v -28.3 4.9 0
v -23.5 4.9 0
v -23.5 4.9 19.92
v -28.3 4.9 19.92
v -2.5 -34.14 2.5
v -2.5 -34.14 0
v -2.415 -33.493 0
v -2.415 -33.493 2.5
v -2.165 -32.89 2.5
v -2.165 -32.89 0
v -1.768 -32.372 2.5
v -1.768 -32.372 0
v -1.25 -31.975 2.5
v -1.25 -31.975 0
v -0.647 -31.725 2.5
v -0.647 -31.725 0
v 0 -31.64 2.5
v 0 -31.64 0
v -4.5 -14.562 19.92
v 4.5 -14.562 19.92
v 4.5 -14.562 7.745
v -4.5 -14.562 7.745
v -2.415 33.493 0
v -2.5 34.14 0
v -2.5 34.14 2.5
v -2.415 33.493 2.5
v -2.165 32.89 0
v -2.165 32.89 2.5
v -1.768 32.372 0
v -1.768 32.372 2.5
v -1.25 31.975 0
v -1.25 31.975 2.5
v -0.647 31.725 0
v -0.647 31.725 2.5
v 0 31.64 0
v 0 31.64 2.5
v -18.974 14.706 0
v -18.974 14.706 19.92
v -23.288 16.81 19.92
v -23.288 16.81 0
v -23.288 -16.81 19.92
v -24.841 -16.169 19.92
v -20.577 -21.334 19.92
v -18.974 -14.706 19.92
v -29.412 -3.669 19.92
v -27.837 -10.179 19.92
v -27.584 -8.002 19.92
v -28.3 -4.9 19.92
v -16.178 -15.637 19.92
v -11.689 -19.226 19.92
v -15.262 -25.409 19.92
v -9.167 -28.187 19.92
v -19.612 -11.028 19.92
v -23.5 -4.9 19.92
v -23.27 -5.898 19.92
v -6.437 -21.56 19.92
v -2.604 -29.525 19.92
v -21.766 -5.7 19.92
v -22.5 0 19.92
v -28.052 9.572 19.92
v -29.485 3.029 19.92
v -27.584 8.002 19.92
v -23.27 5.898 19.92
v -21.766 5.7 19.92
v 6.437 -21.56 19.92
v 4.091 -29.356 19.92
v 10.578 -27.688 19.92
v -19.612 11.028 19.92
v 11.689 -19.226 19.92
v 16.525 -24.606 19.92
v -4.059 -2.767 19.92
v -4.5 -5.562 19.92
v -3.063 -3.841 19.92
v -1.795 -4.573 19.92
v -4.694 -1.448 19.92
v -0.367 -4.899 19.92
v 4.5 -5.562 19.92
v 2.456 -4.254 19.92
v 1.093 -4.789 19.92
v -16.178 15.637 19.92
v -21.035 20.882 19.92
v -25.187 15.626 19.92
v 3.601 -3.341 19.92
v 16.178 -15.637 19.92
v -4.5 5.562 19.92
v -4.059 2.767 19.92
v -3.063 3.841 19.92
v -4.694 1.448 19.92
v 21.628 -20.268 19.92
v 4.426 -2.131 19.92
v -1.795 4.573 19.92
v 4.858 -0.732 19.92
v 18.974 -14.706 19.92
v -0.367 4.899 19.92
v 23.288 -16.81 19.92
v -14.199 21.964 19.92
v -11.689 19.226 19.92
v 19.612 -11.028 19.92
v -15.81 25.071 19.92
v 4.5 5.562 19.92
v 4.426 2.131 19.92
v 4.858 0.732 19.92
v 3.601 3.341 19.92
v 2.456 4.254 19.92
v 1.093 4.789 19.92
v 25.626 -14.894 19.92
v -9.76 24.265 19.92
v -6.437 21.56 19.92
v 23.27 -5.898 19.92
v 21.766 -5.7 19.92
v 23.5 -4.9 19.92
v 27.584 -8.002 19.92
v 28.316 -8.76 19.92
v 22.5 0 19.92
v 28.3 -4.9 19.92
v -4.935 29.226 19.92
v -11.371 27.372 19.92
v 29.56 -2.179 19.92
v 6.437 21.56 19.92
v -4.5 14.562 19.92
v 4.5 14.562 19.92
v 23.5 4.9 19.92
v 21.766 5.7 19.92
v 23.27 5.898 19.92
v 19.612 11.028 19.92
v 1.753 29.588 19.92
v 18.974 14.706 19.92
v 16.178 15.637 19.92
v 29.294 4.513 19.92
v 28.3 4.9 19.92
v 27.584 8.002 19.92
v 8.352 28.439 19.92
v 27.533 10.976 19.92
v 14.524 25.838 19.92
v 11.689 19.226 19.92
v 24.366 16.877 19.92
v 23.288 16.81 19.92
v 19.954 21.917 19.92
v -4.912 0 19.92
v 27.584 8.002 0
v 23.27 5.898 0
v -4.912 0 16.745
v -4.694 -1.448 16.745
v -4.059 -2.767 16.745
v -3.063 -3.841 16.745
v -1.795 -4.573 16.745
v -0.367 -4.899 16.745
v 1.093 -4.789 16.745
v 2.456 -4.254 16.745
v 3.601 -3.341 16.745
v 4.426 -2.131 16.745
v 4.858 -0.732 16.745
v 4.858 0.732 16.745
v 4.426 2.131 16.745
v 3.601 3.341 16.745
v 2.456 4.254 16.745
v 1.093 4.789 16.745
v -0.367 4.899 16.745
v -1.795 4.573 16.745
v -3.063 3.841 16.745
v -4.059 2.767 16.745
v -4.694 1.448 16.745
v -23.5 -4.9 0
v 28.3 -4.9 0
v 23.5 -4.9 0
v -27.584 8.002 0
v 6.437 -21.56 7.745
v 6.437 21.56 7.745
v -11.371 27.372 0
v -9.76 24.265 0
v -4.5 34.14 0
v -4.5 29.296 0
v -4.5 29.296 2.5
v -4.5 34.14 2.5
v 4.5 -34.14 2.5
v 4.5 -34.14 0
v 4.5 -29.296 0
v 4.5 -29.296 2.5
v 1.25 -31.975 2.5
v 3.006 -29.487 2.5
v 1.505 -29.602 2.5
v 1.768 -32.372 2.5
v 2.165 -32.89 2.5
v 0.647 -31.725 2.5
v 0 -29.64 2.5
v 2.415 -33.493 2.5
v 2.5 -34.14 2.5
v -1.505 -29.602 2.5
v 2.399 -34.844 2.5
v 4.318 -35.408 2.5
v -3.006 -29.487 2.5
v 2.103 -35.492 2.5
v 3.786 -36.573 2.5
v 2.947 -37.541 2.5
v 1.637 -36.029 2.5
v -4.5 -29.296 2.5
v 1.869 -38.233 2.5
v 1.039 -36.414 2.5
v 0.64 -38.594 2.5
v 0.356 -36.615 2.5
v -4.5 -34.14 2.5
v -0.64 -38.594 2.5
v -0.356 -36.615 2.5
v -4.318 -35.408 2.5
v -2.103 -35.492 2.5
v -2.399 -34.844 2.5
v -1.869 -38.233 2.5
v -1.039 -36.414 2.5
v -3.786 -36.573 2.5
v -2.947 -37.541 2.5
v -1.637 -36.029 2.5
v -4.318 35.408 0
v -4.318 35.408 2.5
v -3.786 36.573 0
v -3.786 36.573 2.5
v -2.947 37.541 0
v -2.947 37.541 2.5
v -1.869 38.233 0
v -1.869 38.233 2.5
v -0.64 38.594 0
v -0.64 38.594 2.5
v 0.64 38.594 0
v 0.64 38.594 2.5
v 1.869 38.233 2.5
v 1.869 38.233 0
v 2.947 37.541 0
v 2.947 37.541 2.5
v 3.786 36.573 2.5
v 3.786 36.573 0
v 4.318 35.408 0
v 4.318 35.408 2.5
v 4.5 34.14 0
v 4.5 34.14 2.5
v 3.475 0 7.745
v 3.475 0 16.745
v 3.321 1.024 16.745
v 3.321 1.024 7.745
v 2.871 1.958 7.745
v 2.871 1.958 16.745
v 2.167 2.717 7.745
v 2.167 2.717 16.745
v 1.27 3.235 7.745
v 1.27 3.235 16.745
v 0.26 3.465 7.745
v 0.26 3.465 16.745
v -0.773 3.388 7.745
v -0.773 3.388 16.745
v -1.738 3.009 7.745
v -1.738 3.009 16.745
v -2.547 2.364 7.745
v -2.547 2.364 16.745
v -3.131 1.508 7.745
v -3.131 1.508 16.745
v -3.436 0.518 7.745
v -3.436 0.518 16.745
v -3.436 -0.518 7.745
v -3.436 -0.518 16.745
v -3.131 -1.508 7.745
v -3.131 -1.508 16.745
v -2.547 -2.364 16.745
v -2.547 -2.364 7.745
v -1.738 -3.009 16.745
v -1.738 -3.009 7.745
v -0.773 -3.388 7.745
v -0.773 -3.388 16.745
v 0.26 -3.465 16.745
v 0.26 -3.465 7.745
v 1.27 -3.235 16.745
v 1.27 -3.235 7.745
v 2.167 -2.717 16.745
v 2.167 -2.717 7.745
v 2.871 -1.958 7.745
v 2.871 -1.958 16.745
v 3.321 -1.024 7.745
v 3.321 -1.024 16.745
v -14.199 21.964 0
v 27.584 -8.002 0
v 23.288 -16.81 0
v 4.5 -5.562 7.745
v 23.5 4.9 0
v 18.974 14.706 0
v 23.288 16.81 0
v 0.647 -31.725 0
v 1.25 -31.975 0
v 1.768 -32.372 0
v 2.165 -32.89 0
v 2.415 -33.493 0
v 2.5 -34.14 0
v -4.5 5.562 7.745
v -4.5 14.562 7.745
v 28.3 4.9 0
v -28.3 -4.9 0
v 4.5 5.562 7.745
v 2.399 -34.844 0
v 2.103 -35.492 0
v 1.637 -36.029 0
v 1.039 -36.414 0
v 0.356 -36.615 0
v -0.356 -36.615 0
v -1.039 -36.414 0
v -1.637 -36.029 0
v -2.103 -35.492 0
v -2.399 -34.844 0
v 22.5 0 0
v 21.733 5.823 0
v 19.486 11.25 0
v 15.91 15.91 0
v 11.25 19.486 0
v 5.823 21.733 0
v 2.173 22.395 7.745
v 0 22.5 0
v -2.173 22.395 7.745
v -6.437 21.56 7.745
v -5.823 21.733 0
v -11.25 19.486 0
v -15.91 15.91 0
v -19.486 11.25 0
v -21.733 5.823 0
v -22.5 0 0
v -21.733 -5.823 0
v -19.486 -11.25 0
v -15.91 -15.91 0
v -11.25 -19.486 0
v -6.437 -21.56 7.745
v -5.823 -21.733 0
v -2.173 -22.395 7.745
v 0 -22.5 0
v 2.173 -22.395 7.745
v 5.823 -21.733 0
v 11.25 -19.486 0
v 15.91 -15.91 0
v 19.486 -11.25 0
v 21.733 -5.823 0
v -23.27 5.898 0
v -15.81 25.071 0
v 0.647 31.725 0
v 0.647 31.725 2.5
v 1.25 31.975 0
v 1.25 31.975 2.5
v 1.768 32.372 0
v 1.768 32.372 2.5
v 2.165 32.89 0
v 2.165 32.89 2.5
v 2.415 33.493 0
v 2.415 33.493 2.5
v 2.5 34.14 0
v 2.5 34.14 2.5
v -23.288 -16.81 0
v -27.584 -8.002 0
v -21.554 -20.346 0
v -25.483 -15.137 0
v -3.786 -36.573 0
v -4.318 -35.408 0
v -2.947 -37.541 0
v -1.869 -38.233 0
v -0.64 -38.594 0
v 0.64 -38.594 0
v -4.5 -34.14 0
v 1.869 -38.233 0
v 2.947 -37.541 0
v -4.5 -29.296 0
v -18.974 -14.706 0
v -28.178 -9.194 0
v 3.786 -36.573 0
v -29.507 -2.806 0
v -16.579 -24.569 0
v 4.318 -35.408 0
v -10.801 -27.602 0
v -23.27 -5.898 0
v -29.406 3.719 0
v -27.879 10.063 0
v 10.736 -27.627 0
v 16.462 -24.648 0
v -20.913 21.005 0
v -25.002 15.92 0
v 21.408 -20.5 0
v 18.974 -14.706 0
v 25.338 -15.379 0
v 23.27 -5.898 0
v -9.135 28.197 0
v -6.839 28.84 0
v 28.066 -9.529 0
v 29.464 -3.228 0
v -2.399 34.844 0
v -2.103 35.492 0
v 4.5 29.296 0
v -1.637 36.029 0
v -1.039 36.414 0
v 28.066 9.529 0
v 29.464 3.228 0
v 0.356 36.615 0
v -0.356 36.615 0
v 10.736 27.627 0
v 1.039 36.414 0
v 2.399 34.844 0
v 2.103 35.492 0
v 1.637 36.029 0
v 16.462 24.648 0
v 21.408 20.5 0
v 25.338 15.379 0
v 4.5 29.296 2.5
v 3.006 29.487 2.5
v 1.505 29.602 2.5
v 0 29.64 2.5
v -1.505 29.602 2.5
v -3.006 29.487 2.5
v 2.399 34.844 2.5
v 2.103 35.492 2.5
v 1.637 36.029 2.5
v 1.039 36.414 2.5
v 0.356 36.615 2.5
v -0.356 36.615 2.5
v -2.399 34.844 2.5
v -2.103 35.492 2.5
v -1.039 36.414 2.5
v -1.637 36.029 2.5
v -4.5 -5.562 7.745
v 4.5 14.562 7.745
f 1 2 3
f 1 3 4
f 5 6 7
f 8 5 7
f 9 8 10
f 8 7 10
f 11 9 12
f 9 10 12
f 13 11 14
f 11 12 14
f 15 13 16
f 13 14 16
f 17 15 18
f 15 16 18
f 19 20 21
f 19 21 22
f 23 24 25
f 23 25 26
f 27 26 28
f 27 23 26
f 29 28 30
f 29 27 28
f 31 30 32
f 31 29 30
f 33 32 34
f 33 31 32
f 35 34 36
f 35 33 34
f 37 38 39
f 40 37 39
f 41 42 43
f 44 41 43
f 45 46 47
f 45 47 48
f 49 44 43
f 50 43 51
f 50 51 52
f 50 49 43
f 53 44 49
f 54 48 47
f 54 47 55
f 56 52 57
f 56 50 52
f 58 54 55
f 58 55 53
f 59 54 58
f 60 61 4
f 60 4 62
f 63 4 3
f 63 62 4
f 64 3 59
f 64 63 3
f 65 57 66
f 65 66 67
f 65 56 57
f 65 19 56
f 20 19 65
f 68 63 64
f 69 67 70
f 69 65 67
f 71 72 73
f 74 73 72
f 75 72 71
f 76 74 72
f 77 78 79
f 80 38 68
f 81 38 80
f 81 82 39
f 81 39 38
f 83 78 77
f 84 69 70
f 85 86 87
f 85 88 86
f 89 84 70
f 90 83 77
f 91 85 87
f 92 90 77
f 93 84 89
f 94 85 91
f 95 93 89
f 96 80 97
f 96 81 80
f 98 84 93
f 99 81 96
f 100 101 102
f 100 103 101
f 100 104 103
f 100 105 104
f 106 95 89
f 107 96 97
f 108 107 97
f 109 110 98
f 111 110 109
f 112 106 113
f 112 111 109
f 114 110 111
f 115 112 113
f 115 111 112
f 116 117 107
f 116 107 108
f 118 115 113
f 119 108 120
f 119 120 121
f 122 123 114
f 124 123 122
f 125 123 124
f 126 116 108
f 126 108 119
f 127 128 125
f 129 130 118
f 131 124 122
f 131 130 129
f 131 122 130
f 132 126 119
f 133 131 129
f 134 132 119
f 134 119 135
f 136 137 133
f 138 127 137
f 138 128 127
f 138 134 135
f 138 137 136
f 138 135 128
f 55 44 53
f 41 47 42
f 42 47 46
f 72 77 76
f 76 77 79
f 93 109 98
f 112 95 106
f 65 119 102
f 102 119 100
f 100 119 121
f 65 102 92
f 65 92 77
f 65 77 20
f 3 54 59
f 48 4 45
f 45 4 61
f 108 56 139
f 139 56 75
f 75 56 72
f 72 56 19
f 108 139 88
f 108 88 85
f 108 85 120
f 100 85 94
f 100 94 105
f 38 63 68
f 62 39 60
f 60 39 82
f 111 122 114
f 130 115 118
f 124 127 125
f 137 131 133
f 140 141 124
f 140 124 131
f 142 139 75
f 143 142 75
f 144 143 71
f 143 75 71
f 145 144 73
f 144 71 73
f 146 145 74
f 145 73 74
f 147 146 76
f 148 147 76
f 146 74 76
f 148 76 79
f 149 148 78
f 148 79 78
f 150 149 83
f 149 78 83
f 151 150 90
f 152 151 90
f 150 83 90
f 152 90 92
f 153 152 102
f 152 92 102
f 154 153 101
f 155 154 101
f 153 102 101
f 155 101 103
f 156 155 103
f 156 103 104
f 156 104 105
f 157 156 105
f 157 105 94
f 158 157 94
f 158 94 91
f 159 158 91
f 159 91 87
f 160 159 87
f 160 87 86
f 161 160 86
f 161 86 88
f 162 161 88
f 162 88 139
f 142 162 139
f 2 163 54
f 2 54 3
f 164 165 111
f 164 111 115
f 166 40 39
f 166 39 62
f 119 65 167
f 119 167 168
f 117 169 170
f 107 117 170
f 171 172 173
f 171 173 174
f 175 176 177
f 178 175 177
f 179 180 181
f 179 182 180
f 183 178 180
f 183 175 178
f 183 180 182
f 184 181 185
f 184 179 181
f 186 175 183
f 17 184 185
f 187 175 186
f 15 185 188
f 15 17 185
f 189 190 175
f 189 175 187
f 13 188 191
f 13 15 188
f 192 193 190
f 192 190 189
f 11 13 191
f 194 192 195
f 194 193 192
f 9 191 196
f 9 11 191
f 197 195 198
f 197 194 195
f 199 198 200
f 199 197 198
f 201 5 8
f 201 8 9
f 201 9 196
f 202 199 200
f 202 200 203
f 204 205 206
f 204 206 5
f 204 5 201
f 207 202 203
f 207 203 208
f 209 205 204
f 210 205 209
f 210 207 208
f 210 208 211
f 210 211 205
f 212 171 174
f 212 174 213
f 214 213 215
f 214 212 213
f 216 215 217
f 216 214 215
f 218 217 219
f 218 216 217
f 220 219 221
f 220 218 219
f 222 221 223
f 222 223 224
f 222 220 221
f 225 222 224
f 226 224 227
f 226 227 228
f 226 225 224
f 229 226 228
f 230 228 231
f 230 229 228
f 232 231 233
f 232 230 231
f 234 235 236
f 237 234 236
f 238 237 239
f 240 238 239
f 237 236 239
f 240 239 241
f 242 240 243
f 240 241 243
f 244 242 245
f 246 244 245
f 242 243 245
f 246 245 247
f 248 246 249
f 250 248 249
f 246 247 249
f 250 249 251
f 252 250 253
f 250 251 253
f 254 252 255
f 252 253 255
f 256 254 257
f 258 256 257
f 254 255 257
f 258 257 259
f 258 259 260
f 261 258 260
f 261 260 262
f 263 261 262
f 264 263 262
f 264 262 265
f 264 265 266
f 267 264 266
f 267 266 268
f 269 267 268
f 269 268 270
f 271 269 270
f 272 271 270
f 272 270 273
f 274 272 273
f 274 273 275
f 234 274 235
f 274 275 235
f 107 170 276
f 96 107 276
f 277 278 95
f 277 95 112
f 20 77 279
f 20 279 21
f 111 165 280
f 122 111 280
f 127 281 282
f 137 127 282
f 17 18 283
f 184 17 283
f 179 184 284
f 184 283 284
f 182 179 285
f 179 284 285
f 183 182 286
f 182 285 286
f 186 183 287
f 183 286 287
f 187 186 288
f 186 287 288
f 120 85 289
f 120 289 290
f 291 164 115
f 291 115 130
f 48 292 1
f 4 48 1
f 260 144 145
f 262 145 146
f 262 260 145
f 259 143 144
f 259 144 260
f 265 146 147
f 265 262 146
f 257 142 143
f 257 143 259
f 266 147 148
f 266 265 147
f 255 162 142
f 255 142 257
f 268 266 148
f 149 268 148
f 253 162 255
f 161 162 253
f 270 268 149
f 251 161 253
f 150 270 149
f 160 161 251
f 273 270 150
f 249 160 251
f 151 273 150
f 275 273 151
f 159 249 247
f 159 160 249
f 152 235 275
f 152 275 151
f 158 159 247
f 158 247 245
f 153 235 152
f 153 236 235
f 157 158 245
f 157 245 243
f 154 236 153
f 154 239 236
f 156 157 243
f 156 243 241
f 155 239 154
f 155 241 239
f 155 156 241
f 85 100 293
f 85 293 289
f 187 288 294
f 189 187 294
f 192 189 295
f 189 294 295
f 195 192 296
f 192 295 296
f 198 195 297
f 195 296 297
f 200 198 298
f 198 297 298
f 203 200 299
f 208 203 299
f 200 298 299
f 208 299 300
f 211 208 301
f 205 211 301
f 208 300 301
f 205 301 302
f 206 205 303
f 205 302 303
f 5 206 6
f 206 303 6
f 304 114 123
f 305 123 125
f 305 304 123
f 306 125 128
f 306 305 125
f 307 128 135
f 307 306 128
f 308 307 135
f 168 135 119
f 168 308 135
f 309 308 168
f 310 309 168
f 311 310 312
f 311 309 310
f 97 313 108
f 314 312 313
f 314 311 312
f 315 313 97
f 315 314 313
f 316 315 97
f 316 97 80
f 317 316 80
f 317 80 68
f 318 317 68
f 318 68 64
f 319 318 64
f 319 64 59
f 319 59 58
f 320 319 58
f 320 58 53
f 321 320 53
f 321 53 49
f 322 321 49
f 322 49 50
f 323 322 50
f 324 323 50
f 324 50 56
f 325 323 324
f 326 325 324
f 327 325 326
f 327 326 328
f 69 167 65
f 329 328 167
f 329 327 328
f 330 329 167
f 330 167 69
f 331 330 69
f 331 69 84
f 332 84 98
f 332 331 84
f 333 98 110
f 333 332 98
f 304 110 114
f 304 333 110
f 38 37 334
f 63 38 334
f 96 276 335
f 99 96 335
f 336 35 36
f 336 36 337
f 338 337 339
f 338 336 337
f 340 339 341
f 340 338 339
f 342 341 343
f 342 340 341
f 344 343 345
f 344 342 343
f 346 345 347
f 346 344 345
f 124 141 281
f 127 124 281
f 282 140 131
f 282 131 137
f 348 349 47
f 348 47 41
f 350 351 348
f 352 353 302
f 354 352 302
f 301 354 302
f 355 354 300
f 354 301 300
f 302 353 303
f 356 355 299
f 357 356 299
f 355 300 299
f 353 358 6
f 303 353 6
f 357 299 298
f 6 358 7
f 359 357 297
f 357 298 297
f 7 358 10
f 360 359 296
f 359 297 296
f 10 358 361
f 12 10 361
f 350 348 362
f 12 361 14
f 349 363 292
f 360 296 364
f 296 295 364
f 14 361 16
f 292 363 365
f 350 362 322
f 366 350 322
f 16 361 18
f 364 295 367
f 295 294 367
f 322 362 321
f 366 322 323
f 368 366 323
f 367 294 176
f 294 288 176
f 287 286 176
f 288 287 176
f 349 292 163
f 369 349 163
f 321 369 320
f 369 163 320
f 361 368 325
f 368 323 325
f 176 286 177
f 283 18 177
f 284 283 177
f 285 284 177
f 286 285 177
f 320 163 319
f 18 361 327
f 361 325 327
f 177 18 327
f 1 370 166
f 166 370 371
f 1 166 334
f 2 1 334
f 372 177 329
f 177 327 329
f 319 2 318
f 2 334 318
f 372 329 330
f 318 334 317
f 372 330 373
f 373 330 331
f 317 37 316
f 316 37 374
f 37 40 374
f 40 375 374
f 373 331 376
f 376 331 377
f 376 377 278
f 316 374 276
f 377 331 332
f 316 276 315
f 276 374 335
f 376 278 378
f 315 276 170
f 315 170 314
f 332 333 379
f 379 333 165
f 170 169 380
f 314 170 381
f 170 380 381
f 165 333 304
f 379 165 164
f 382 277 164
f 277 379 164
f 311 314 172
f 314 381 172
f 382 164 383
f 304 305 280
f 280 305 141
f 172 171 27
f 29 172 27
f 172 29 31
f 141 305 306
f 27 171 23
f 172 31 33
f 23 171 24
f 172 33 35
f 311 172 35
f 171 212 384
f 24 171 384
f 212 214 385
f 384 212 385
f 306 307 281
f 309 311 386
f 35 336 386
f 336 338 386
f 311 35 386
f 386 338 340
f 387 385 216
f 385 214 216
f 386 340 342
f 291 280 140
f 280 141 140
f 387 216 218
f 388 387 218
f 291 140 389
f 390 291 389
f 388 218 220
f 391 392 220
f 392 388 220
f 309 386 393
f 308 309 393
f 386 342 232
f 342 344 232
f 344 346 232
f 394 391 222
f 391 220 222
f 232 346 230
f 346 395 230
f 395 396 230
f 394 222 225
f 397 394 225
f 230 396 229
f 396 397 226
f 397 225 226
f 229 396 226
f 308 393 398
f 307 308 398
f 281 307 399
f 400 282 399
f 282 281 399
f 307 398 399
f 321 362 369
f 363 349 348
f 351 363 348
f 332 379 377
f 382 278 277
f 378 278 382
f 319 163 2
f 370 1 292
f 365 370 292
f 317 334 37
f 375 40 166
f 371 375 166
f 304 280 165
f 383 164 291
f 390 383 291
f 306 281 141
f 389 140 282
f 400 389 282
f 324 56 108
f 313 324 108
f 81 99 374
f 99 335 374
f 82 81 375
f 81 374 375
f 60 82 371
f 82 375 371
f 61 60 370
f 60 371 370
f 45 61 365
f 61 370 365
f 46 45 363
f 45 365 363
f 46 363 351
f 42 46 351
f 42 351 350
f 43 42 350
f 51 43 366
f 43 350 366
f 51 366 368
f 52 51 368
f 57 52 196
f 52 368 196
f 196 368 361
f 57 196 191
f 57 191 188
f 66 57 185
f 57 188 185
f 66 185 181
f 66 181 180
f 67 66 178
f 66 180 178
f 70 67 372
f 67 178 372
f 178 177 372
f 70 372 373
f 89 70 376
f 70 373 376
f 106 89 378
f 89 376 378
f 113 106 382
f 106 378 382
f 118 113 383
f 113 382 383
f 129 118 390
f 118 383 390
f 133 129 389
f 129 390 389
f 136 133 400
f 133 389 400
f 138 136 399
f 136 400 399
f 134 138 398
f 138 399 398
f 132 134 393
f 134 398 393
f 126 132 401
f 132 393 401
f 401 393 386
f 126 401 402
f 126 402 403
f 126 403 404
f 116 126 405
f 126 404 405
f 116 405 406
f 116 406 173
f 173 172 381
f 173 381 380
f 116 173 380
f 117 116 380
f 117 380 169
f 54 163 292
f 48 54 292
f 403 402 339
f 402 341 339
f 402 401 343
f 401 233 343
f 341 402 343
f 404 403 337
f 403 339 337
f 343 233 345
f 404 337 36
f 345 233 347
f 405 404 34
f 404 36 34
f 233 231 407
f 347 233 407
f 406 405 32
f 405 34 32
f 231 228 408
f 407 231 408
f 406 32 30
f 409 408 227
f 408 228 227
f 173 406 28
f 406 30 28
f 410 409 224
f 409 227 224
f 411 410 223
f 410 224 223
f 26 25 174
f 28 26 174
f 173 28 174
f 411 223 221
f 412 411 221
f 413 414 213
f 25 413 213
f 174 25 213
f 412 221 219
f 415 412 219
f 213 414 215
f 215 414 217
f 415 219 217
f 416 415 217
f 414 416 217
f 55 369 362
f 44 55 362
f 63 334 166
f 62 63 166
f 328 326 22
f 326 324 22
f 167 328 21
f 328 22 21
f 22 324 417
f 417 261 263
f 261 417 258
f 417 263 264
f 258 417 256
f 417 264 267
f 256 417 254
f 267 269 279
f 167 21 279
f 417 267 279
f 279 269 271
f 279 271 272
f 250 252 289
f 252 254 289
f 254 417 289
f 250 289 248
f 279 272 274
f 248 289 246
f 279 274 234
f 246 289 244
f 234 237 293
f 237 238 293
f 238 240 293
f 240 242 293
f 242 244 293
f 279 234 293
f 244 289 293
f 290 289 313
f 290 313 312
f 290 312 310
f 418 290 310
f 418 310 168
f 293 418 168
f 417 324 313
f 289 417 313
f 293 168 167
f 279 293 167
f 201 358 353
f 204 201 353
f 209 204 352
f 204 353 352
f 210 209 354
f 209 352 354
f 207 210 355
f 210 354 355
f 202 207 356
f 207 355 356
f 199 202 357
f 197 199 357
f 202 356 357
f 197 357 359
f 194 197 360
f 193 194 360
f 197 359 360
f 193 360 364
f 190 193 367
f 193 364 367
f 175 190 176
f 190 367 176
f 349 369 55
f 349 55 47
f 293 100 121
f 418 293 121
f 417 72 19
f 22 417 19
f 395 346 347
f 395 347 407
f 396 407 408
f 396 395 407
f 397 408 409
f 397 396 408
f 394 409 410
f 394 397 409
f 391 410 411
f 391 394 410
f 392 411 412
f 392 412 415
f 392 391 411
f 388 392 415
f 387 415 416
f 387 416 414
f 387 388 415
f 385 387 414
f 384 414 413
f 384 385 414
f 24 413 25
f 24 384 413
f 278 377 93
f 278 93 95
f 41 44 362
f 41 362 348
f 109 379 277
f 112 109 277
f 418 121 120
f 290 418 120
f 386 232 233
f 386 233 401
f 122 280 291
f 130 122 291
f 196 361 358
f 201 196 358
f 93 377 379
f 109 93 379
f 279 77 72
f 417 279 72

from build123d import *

# Parameters (mm, degrees)
SKETCH1_R                       = 29.64
SKETCH1_R_2                     = 22.5
BOSS_EXTRUDE1_DEPTH             = 19.92
SKETCH4_W                       = 12.873355566
SKETCH4_H                       = 48.428243032
BOSS_EXTRUDE3_DEPTH             = 3.175
CUT_EXTRUDE2_REACH              = 48.41
SKETCH7_R                       = 4.9125
CUT_EXTRUDE2_DIRECTION_2_DEPTH  = 47.409757595
SKETCH8_W                       = 12.873355566
SKETCH8_H                       = 48.17275248
SKETCH8_R                       = 3.475
BOSS_EXTRUDE4_DEPTH             = 9
SKETCH1_3_W                     = 4.8
SKETCH1_3_H                     = 9.8
CUT_EXTRUDE1_DEPTH              = 20
CIRPATTERN1_COUNT               = 2
CIRPATTERN1_ANGLE               = 26
CIRPATTERN1_THE_OTHER_WAY_COUNT = 2
CIRPATTERN1_THE_OTHER_WAY_ANGLE = 26
SKETCH11_W                      = 9
SKETCH11_H                      = 9
CUT_EXTRUDE21_DEPTH             = 29
BOSS_EXTRUDE5_DEPTH             = 2.5
MIRROR3_COPY_1_SKETCH_W         = 4.8
MIRROR3_COPY_1_SKETCH_H         = 9.8
MIRROR3_COPY_1_DEPTH            = 20
MIRROR3_COPY_2_SKETCH_W         = 4.8
MIRROR3_COPY_2_SKETCH_H         = 9.8
MIRROR3_COPY_2_DEPTH            = 20
CUT_EXTRUDE22_DEPTH             = 53.615450202
CUT_EXTRUDE22_DEPTH_BACK        = 53.615450202


with BuildPart() as part:
    # Sketch1 → Boss-Extrude1 (new body)
    with BuildSketch(Plane.XY):
        Circle(SKETCH1_R)
        Circle(SKETCH1_R_2, mode=Mode.SUBTRACT)
    extrude(amount=BOSS_EXTRUDE1_DEPTH)

    # Sketch4 → Boss-Extrude3 (add)
    with BuildSketch(Plane.XY.offset(19.92)):
        Rectangle(SKETCH4_W, SKETCH4_H)
    extrude(amount=-BOSS_EXTRUDE3_DEPTH)

    # Sketch7 → Cut-Extrude2 (cut, up to next)
    with BuildSketch(Plane.XY.offset(19.92), mode=Mode.PRIVATE) as cut_extrude2_sk1:
        with Locations(Location((0, 0, 0), (0, 0, 180))):
            Circle(SKETCH7_R)
    cut_extrude2_tool1 = extrude(cut_extrude2_sk1.sketch, amount=-CUT_EXTRUDE2_REACH, mode=Mode.PRIVATE) & part.part
    add(cut_extrude2_tool1.solids().sort_by_distance((0, 0, 19.92))[0], mode=Mode.SUBTRACT)

    # Sketch7 → Cut-Extrude2 direction 2 (cut)
    with BuildSketch(Plane.XY.offset(19.92)):
        with Locations(Location((0, 0, 0), (0, 0, 180))):
            Circle(SKETCH7_R)
    extrude(amount=CUT_EXTRUDE2_DIRECTION_2_DEPTH, mode=Mode.SUBTRACT)

    # Sketch8 → Boss-Extrude4 (add)
    with BuildSketch(Plane.XY.offset(16.745)):
        Rectangle(SKETCH8_W, SKETCH8_H)
        Circle(SKETCH8_R, mode=Mode.SUBTRACT)
    extrude(amount=-BOSS_EXTRUDE4_DEPTH)

    # Sketch1<3> → Cut-Extrude1 (cut)
    with BuildSketch(Plane.XY):
        with Locations((25.9, 0)):
            Rectangle(SKETCH1_3_W, SKETCH1_3_H)
    cut_extrude1 = extrude(amount=CUT_EXTRUDE1_DEPTH, mode=Mode.SUBTRACT)

    # CirPattern1: Cut-Extrude1 ×2 about axis
    cirpattern1_axis = Axis((0, 0, 0), (0, 0, 1))
    for i in range(1, CIRPATTERN1_COUNT):
        add(cut_extrude1.rotate(cirpattern1_axis, i * CIRPATTERN1_ANGLE / (CIRPATTERN1_COUNT - 1)), mode=Mode.SUBTRACT)

    # CirPattern1 the other way: Cut-Extrude1 ×2 about axis
    cirpattern1_the_other_way_axis = Axis((0, 0, 0), (0, 0, -1))
    for i in range(1, CIRPATTERN1_THE_OTHER_WAY_COUNT):
        add(cut_extrude1.rotate(cirpattern1_the_other_way_axis, i * CIRPATTERN1_THE_OTHER_WAY_ANGLE / (CIRPATTERN1_THE_OTHER_WAY_COUNT - 1)), mode=Mode.SUBTRACT)

    # Sketch11 → Cut-Extrude21 (cut)
    with BuildSketch(Plane(origin=(0, 0, 19.92), x_dir=(-1, 0, 0), z_dir=(0, 0, -1))):
        with Locations((0, 10.0625)):
            Rectangle(SKETCH11_W, SKETCH11_H)
    cut_extrude21 = extrude(amount=CUT_EXTRUDE21_DEPTH, mode=Mode.SUBTRACT)

    # Mirror1: Cut-Extrude21 across plane
    add(cut_extrude21.mirror(Plane.ZX), mode=Mode.SUBTRACT)

    # Sketch12 → Boss-Extrude5 (add)
    with BuildSketch(Plane(origin=(0, 0, 0), x_dir=(-1, 0, 0), z_dir=(0, 0, -1))):
        with BuildLine():
            Line((0, 29.64), (0, 31.64))
            ThreePointArc((0, 31.64), (-1.767766953, 32.372233047), (-2.5, 34.14))
            Line((-2.5, 34.14), (-4.5, 34.14))
            Line((-4.5, 34.14), (-4.5, 29.296409336))
            ThreePointArc((-4.5, 29.296409336), (-2.256549055, 29.553977505), (0, 29.64))
        make_face()
        with BuildLine():
            ThreePointArc((2.5, 34.14), (1.767766953, 32.372233047), (0, 31.64))
            Line((0, 31.64), (0, 29.64))
            ThreePointArc((0, 29.64), (2.256549055, 29.553977505), (4.5, 29.296409336))
            Line((4.5, 29.296409336), (4.5, 34.14))
            ThreePointArc((4.5, 34.14), (0, 38.64), (-4.5, 34.14))
            Line((-4.5, 34.14), (-2.5, 34.14))
            ThreePointArc((-2.5, 34.14), (0, 36.64), (2.5, 34.14))
        make_face()
    boss_extrude5 = extrude(amount=-BOSS_EXTRUDE5_DEPTH)

    # Mirror2: Boss-Extrude5 across plane
    add(boss_extrude5.mirror(Plane.ZX))

    # Mirror3: Cut-Extrude1 across plane
    add(cut_extrude1.mirror(Plane(origin=(0, 0, 0), x_dir=(0, 0, 1), z_dir=(1, 0, 0))), mode=Mode.SUBTRACT)

    # Mirror3 copy 1 sketch → Mirror3 copy 1 (cut)
    with BuildSketch(Plane(origin=(0, 0, 0), x_dir=(-0.8987940462991663, 0.43837114678907885, 0), z_dir=(0, 0, 1))):
        with Locations((25.9, 0)):
            Rectangle(MIRROR3_COPY_1_SKETCH_W, MIRROR3_COPY_1_SKETCH_H)
    extrude(amount=MIRROR3_COPY_1_DEPTH, mode=Mode.SUBTRACT)

    # Mirror3 copy 2 sketch → Mirror3 copy 2 (cut)
    with BuildSketch(Plane(origin=(0, 0, 0), x_dir=(-0.8987940462991663, -0.43837114678907885, 0), z_dir=(0, 0, 1))):
        with Locations((25.9, 0)):
            Rectangle(MIRROR3_COPY_2_SKETCH_W, MIRROR3_COPY_2_SKETCH_H)
    extrude(amount=MIRROR3_COPY_2_DEPTH, mode=Mode.SUBTRACT)

    # Sketch13 → Cut-Extrude22 (cut, two sides: drawn at the far end of the back side and taken through both)
    with BuildSketch(Plane.XY.offset(-CUT_EXTRUDE22_DEPTH_BACK)):
        Polygon((-9.760082808, 24.264783614), (-14.199291993, 21.964039863), (-15.809812619, 25.071486294), (-11.370603433, 27.372230044), align=None)
        Polygon((-16.779237208, 26.941959066), (-12.340028022, 29.242702816), (-11.370603433, 27.372230044), (-15.809812619, 25.071486294), align=None)
    extrude(amount=CUT_EXTRUDE22_DEPTH + CUT_EXTRUDE22_DEPTH_BACK, mode=Mode.SUBTRACT)


solid = part.part
